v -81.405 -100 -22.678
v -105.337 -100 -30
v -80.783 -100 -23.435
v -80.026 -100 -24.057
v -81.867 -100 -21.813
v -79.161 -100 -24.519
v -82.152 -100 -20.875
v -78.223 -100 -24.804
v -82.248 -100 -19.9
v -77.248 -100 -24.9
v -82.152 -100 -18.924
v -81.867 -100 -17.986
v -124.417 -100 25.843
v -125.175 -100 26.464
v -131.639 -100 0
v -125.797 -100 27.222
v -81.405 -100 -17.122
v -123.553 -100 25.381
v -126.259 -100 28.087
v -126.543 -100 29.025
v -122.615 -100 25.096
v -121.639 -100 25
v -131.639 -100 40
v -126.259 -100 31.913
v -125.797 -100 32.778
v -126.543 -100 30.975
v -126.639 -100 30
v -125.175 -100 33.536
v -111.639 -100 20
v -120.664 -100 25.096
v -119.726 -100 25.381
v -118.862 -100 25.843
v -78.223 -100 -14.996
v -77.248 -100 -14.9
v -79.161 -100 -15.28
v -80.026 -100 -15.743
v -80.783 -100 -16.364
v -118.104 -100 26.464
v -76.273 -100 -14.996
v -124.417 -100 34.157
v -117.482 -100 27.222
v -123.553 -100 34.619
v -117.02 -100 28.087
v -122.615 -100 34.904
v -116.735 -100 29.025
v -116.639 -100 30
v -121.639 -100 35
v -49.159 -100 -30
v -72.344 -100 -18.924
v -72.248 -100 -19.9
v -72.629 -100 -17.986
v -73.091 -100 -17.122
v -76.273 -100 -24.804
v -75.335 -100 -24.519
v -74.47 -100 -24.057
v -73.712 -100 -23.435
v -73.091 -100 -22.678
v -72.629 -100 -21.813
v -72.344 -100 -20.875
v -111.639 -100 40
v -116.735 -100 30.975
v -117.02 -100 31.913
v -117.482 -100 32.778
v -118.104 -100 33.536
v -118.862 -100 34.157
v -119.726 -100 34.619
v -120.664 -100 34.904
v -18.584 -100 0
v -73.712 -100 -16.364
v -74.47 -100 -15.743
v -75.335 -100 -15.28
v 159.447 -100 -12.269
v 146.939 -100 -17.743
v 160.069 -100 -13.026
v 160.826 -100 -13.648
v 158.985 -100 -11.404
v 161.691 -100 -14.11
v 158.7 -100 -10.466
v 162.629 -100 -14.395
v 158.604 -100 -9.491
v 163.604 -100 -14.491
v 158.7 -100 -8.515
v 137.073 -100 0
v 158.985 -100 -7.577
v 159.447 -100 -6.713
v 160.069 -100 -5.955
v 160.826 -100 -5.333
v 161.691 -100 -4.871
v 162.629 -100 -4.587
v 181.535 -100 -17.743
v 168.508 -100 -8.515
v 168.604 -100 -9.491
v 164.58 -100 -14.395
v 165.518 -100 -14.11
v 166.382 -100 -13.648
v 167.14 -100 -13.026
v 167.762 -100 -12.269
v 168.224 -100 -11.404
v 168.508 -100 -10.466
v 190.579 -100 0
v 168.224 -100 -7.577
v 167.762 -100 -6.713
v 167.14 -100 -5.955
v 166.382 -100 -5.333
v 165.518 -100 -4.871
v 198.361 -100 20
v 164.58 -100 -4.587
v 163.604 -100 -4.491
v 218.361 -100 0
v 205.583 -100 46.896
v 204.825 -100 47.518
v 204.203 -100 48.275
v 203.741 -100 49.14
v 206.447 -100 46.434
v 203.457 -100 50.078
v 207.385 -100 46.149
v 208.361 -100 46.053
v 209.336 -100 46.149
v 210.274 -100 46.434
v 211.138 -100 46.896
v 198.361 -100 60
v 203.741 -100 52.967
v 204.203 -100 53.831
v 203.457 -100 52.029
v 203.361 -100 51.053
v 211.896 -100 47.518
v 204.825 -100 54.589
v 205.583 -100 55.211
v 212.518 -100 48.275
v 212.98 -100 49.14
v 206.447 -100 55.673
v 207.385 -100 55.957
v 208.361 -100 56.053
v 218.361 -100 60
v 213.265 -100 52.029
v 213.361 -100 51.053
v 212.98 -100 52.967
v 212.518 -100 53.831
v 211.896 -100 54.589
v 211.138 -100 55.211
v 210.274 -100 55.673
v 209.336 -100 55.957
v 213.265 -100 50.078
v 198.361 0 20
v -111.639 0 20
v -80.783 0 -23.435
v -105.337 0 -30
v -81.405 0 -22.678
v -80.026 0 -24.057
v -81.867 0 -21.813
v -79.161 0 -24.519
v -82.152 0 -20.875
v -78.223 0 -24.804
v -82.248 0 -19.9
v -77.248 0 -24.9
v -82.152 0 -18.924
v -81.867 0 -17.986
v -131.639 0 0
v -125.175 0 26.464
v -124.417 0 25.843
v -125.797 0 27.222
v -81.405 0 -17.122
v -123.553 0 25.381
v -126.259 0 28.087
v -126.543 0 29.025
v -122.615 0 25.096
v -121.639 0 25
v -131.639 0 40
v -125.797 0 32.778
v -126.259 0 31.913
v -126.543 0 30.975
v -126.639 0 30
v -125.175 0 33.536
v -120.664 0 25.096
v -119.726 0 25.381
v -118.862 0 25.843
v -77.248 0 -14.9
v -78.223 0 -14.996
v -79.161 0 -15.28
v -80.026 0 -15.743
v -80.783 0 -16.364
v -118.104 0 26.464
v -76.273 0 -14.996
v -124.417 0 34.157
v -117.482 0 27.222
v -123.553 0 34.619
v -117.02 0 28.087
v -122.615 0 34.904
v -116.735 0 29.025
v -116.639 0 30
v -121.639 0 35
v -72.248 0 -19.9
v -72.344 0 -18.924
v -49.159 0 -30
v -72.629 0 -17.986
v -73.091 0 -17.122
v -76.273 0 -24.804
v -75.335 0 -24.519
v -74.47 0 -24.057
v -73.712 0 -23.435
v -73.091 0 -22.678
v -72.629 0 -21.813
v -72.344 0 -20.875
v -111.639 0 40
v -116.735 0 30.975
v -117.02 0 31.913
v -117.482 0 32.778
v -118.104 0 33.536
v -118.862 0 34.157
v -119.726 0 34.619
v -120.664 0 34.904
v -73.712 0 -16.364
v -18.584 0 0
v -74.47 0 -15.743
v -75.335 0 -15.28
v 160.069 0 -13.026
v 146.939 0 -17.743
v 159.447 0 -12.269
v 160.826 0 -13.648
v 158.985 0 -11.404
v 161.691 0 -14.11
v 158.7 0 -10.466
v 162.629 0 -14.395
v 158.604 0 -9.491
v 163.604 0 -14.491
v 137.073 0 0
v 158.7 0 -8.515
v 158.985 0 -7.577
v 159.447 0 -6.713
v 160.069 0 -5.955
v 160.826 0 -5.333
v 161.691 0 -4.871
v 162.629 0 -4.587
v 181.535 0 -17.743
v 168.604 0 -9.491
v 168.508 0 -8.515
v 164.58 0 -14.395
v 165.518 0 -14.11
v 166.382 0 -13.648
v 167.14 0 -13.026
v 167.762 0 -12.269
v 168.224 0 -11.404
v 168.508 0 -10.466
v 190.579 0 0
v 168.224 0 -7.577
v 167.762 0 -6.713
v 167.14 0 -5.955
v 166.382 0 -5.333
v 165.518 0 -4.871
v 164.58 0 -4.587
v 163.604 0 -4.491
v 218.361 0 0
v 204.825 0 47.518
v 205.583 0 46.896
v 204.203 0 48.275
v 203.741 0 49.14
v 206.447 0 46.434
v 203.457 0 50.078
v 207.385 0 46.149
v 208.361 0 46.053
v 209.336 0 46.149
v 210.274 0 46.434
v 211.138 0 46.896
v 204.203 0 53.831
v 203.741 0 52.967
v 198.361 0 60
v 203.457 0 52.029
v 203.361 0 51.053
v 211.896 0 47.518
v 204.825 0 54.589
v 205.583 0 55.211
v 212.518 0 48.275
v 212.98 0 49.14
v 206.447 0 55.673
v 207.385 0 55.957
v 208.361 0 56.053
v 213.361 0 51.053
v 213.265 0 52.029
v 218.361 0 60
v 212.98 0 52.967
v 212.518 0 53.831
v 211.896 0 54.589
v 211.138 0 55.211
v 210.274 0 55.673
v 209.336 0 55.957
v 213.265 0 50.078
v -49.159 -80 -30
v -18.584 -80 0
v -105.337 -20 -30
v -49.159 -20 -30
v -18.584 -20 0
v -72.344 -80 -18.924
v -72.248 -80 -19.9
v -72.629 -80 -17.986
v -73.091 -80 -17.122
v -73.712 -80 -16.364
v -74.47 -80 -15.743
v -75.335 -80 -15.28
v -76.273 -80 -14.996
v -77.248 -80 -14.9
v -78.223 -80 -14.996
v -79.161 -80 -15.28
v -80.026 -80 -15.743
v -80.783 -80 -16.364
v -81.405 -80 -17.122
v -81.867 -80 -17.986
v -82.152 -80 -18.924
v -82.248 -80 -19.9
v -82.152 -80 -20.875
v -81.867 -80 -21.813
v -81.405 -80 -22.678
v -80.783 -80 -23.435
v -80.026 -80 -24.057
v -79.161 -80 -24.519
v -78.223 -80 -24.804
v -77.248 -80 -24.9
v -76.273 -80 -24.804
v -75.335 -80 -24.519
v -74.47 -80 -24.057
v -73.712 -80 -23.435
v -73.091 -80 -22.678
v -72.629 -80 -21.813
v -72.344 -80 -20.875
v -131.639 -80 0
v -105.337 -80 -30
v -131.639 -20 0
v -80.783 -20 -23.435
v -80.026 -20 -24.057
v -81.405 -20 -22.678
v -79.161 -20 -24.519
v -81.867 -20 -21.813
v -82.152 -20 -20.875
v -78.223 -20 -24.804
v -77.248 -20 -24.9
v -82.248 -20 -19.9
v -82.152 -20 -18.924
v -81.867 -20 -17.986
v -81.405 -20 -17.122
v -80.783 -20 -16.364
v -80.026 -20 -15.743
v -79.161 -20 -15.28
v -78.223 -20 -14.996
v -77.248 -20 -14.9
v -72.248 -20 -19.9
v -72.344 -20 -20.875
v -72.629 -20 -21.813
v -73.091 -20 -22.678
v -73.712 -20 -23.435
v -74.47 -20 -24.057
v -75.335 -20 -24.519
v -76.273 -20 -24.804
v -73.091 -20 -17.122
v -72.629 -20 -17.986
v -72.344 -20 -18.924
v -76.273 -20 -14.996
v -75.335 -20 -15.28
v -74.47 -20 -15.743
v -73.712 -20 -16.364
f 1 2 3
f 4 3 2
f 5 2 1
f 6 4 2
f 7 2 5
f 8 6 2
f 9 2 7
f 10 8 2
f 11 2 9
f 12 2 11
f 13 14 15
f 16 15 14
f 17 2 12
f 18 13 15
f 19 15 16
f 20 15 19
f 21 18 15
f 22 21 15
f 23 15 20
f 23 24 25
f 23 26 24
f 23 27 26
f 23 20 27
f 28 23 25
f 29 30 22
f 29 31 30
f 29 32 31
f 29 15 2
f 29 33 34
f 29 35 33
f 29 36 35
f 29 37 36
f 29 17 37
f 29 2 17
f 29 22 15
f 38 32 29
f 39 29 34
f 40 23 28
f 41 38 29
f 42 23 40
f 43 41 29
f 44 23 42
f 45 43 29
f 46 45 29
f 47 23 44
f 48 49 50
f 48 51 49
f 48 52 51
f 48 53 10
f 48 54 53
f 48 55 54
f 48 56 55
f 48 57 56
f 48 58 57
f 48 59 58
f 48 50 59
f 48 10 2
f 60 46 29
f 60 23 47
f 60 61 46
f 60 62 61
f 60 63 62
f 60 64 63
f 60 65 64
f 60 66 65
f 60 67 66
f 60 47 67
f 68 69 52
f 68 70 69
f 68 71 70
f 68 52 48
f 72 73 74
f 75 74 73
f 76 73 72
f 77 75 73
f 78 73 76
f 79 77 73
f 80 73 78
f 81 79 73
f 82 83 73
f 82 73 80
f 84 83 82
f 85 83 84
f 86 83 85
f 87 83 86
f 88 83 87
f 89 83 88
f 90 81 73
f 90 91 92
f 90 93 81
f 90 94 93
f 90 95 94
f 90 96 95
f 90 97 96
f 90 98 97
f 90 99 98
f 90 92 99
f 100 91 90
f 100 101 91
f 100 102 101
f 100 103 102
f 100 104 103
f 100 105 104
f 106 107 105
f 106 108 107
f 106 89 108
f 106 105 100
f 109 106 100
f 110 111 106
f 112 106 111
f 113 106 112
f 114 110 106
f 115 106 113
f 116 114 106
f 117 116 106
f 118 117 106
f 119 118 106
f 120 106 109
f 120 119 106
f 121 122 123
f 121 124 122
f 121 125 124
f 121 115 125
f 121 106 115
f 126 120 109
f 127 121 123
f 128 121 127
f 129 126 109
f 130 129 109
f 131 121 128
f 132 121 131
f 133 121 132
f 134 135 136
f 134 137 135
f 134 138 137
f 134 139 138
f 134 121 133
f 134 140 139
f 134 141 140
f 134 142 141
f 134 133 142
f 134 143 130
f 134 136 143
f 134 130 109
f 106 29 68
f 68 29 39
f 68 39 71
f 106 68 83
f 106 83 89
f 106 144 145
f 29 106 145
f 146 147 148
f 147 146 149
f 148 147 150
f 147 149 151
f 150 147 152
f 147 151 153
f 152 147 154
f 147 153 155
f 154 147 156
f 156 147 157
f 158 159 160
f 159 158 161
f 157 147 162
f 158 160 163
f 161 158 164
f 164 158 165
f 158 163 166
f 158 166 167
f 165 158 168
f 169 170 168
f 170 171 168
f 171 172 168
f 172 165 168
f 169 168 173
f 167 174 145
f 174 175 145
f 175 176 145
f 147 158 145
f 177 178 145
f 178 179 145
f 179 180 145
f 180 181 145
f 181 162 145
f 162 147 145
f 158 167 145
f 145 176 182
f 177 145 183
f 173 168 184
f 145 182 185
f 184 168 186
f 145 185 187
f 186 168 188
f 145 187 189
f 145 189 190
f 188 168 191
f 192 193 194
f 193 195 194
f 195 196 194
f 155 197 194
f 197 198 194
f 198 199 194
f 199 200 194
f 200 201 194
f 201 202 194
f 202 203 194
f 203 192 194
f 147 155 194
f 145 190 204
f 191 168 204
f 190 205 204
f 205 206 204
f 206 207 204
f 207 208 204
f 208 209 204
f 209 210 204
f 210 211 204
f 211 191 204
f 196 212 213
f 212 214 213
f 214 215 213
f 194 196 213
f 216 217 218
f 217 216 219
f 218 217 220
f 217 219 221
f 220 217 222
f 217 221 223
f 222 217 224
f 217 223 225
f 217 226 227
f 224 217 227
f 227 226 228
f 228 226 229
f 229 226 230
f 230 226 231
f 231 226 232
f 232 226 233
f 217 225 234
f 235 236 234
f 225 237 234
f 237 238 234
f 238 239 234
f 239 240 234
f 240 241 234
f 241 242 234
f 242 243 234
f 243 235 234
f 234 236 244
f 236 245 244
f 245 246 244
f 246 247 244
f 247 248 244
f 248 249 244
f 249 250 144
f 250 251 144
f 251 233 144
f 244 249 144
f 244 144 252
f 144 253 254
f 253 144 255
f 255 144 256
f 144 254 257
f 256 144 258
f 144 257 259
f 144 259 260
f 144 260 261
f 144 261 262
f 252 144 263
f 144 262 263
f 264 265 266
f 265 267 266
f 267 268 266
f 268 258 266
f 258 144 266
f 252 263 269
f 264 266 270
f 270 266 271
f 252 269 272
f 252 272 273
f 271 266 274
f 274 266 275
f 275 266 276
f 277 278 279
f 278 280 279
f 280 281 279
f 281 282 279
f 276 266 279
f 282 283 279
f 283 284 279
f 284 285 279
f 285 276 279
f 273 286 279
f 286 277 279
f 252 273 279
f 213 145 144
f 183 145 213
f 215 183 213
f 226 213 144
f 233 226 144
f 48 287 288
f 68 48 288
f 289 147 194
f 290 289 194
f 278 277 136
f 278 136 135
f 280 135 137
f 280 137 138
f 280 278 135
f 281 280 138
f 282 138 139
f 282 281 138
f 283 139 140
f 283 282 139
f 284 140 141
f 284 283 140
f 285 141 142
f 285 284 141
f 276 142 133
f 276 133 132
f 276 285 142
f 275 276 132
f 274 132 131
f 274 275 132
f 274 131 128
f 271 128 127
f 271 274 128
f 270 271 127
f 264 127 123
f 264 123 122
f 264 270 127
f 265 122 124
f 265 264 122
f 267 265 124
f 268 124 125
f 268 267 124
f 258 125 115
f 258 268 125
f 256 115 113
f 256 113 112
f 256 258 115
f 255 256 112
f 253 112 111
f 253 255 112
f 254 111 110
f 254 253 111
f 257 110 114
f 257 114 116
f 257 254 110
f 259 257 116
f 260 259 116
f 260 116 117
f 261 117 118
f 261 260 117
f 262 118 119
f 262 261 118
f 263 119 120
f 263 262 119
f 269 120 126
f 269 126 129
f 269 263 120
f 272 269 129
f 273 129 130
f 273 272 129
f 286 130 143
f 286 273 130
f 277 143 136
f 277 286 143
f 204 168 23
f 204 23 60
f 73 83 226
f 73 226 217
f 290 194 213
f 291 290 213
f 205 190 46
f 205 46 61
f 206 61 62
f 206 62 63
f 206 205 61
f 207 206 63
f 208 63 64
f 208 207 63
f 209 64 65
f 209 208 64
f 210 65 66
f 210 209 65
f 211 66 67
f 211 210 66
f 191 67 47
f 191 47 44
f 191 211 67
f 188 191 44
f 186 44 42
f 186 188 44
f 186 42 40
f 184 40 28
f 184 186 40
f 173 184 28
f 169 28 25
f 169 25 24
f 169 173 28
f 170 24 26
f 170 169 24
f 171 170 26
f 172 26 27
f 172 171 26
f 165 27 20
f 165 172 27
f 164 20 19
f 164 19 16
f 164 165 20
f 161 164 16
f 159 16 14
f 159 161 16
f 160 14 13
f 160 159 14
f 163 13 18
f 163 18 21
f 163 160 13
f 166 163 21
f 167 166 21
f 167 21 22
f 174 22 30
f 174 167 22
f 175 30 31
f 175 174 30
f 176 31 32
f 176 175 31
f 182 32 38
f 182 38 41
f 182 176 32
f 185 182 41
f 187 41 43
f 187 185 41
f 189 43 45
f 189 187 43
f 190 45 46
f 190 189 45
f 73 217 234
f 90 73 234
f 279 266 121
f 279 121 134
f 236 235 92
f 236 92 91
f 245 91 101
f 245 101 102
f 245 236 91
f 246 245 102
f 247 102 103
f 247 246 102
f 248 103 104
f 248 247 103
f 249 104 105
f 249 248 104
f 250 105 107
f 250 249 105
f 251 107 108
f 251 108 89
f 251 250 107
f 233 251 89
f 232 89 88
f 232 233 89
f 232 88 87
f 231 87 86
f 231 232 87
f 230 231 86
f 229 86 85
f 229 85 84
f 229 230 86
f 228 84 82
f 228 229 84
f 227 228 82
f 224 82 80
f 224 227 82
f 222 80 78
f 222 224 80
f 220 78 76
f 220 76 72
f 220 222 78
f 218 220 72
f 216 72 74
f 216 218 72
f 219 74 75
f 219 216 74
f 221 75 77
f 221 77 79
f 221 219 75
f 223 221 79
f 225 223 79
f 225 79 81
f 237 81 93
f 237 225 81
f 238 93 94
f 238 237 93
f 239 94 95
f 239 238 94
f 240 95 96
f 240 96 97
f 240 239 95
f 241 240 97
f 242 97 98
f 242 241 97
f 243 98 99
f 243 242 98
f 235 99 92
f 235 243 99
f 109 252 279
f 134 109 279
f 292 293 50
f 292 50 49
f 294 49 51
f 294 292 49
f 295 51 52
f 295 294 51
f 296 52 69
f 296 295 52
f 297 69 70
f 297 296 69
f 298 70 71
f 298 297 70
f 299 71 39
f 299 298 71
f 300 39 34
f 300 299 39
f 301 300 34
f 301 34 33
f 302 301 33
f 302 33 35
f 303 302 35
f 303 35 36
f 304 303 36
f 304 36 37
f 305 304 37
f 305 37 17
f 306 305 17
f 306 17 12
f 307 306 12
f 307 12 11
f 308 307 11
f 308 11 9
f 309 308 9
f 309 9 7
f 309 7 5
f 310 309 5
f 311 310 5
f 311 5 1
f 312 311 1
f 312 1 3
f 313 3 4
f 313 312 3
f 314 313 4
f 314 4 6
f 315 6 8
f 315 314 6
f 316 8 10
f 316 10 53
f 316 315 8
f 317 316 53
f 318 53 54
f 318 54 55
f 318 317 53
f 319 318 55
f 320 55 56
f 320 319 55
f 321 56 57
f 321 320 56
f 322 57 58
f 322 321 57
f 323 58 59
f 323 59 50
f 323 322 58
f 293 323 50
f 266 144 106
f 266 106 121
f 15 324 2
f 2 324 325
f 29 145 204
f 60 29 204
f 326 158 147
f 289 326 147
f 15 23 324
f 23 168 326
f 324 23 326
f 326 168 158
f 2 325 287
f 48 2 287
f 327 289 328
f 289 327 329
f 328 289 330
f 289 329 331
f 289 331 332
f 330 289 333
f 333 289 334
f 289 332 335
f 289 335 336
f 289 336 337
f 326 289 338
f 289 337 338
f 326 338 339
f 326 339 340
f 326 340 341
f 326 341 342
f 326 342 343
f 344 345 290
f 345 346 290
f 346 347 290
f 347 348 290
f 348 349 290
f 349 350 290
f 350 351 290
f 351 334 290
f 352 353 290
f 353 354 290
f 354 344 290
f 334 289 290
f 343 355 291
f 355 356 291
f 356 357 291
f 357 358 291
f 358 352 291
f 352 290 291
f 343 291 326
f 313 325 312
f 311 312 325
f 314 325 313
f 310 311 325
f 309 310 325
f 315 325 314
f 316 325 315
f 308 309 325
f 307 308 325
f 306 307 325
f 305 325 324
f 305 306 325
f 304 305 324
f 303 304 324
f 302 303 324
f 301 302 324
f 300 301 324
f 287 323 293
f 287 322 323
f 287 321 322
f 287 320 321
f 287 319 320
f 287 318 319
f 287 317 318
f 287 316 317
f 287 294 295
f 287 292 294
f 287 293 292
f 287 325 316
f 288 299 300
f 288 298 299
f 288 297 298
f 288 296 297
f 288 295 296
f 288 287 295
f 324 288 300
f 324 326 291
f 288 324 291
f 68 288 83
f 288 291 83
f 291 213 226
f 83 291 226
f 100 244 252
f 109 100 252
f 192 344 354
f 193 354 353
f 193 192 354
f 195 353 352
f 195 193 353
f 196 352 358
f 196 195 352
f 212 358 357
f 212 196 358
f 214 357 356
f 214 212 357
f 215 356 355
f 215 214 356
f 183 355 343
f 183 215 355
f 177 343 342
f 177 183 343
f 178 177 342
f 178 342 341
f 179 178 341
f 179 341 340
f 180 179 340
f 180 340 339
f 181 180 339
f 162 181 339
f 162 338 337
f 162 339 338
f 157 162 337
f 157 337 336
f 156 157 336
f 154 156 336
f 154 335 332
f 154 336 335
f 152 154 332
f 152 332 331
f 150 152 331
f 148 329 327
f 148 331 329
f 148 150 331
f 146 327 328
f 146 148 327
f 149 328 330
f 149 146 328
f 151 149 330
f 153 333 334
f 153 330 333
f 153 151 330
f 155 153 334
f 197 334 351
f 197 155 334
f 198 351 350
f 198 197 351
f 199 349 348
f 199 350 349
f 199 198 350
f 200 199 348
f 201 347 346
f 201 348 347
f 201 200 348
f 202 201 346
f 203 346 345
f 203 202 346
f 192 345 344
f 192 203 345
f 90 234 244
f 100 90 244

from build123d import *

# Parameters (mm, degrees)
F0_W     = 20
F0_H     = 20
F0_R     = 5
F0_H_2   = 40
F1_DEPTH = 100
F2_W     = 60
F2_H     = 34.6079095881
F3_DEPTH = 131.6404025087


# Not quite as in the source:
# - a feature names something its author has since deleted; it is built from what else it names


with BuildPart() as f1:
    # F0 (on Front) → F1 (new body)
    with BuildSketch(Plane.XZ):
        Polygon((-131.6394025087, 20), (-131.6394025087, 0), (-18.5843738595, 0), (137.0734572411, 0), (190.578520298, 0), (218.3605974913, 0), (218.3605974913, 20), (198.3605974913, 20), (-111.6394025087, 20), align=None)
        with Locations((-121.6394025087, 30)):
            Rectangle(F0_W, F0_H)
        with Locations((-121.6394025087, 30)):
            Circle(F0_R, mode=Mode.SUBTRACT)
        with Locations((208.3605974913, 40)):
            Rectangle(F0_W, F0_H_2)
        with Locations((208.3605974913, 51.0531589389)):
            Circle(F0_R, mode=Mode.SUBTRACT)
        Polygon((190.578520298, 0), (137.0734572411, 0), (146.9386657926, -17.7425388247), (181.5354246128, -17.7425388247), align=None)
        with Locations((163.6041871454, -9.4907971493)):
            Circle(F0_R, mode=Mode.SUBTRACT)
        Polygon((-18.5843738595, 0), (-131.6394025087, 0), (-105.3372249007, -30), (-49.1586900184, -30), align=None)
        with Locations((-77.2479574596, -19.8998747039)):
            Circle(F0_R, mode=Mode.SUBTRACT)
    extrude(amount=F1_DEPTH)

    # F2 (on Right) → F3 (cut, through all)
    with BuildSketch(Plane.YZ):
        with Locations((-50, -17.3039547941)):
            Rectangle(F2_W, F2_H)
    extrude(amount=-F3_DEPTH, mode=Mode.SUBTRACT)


solid = f1.part
